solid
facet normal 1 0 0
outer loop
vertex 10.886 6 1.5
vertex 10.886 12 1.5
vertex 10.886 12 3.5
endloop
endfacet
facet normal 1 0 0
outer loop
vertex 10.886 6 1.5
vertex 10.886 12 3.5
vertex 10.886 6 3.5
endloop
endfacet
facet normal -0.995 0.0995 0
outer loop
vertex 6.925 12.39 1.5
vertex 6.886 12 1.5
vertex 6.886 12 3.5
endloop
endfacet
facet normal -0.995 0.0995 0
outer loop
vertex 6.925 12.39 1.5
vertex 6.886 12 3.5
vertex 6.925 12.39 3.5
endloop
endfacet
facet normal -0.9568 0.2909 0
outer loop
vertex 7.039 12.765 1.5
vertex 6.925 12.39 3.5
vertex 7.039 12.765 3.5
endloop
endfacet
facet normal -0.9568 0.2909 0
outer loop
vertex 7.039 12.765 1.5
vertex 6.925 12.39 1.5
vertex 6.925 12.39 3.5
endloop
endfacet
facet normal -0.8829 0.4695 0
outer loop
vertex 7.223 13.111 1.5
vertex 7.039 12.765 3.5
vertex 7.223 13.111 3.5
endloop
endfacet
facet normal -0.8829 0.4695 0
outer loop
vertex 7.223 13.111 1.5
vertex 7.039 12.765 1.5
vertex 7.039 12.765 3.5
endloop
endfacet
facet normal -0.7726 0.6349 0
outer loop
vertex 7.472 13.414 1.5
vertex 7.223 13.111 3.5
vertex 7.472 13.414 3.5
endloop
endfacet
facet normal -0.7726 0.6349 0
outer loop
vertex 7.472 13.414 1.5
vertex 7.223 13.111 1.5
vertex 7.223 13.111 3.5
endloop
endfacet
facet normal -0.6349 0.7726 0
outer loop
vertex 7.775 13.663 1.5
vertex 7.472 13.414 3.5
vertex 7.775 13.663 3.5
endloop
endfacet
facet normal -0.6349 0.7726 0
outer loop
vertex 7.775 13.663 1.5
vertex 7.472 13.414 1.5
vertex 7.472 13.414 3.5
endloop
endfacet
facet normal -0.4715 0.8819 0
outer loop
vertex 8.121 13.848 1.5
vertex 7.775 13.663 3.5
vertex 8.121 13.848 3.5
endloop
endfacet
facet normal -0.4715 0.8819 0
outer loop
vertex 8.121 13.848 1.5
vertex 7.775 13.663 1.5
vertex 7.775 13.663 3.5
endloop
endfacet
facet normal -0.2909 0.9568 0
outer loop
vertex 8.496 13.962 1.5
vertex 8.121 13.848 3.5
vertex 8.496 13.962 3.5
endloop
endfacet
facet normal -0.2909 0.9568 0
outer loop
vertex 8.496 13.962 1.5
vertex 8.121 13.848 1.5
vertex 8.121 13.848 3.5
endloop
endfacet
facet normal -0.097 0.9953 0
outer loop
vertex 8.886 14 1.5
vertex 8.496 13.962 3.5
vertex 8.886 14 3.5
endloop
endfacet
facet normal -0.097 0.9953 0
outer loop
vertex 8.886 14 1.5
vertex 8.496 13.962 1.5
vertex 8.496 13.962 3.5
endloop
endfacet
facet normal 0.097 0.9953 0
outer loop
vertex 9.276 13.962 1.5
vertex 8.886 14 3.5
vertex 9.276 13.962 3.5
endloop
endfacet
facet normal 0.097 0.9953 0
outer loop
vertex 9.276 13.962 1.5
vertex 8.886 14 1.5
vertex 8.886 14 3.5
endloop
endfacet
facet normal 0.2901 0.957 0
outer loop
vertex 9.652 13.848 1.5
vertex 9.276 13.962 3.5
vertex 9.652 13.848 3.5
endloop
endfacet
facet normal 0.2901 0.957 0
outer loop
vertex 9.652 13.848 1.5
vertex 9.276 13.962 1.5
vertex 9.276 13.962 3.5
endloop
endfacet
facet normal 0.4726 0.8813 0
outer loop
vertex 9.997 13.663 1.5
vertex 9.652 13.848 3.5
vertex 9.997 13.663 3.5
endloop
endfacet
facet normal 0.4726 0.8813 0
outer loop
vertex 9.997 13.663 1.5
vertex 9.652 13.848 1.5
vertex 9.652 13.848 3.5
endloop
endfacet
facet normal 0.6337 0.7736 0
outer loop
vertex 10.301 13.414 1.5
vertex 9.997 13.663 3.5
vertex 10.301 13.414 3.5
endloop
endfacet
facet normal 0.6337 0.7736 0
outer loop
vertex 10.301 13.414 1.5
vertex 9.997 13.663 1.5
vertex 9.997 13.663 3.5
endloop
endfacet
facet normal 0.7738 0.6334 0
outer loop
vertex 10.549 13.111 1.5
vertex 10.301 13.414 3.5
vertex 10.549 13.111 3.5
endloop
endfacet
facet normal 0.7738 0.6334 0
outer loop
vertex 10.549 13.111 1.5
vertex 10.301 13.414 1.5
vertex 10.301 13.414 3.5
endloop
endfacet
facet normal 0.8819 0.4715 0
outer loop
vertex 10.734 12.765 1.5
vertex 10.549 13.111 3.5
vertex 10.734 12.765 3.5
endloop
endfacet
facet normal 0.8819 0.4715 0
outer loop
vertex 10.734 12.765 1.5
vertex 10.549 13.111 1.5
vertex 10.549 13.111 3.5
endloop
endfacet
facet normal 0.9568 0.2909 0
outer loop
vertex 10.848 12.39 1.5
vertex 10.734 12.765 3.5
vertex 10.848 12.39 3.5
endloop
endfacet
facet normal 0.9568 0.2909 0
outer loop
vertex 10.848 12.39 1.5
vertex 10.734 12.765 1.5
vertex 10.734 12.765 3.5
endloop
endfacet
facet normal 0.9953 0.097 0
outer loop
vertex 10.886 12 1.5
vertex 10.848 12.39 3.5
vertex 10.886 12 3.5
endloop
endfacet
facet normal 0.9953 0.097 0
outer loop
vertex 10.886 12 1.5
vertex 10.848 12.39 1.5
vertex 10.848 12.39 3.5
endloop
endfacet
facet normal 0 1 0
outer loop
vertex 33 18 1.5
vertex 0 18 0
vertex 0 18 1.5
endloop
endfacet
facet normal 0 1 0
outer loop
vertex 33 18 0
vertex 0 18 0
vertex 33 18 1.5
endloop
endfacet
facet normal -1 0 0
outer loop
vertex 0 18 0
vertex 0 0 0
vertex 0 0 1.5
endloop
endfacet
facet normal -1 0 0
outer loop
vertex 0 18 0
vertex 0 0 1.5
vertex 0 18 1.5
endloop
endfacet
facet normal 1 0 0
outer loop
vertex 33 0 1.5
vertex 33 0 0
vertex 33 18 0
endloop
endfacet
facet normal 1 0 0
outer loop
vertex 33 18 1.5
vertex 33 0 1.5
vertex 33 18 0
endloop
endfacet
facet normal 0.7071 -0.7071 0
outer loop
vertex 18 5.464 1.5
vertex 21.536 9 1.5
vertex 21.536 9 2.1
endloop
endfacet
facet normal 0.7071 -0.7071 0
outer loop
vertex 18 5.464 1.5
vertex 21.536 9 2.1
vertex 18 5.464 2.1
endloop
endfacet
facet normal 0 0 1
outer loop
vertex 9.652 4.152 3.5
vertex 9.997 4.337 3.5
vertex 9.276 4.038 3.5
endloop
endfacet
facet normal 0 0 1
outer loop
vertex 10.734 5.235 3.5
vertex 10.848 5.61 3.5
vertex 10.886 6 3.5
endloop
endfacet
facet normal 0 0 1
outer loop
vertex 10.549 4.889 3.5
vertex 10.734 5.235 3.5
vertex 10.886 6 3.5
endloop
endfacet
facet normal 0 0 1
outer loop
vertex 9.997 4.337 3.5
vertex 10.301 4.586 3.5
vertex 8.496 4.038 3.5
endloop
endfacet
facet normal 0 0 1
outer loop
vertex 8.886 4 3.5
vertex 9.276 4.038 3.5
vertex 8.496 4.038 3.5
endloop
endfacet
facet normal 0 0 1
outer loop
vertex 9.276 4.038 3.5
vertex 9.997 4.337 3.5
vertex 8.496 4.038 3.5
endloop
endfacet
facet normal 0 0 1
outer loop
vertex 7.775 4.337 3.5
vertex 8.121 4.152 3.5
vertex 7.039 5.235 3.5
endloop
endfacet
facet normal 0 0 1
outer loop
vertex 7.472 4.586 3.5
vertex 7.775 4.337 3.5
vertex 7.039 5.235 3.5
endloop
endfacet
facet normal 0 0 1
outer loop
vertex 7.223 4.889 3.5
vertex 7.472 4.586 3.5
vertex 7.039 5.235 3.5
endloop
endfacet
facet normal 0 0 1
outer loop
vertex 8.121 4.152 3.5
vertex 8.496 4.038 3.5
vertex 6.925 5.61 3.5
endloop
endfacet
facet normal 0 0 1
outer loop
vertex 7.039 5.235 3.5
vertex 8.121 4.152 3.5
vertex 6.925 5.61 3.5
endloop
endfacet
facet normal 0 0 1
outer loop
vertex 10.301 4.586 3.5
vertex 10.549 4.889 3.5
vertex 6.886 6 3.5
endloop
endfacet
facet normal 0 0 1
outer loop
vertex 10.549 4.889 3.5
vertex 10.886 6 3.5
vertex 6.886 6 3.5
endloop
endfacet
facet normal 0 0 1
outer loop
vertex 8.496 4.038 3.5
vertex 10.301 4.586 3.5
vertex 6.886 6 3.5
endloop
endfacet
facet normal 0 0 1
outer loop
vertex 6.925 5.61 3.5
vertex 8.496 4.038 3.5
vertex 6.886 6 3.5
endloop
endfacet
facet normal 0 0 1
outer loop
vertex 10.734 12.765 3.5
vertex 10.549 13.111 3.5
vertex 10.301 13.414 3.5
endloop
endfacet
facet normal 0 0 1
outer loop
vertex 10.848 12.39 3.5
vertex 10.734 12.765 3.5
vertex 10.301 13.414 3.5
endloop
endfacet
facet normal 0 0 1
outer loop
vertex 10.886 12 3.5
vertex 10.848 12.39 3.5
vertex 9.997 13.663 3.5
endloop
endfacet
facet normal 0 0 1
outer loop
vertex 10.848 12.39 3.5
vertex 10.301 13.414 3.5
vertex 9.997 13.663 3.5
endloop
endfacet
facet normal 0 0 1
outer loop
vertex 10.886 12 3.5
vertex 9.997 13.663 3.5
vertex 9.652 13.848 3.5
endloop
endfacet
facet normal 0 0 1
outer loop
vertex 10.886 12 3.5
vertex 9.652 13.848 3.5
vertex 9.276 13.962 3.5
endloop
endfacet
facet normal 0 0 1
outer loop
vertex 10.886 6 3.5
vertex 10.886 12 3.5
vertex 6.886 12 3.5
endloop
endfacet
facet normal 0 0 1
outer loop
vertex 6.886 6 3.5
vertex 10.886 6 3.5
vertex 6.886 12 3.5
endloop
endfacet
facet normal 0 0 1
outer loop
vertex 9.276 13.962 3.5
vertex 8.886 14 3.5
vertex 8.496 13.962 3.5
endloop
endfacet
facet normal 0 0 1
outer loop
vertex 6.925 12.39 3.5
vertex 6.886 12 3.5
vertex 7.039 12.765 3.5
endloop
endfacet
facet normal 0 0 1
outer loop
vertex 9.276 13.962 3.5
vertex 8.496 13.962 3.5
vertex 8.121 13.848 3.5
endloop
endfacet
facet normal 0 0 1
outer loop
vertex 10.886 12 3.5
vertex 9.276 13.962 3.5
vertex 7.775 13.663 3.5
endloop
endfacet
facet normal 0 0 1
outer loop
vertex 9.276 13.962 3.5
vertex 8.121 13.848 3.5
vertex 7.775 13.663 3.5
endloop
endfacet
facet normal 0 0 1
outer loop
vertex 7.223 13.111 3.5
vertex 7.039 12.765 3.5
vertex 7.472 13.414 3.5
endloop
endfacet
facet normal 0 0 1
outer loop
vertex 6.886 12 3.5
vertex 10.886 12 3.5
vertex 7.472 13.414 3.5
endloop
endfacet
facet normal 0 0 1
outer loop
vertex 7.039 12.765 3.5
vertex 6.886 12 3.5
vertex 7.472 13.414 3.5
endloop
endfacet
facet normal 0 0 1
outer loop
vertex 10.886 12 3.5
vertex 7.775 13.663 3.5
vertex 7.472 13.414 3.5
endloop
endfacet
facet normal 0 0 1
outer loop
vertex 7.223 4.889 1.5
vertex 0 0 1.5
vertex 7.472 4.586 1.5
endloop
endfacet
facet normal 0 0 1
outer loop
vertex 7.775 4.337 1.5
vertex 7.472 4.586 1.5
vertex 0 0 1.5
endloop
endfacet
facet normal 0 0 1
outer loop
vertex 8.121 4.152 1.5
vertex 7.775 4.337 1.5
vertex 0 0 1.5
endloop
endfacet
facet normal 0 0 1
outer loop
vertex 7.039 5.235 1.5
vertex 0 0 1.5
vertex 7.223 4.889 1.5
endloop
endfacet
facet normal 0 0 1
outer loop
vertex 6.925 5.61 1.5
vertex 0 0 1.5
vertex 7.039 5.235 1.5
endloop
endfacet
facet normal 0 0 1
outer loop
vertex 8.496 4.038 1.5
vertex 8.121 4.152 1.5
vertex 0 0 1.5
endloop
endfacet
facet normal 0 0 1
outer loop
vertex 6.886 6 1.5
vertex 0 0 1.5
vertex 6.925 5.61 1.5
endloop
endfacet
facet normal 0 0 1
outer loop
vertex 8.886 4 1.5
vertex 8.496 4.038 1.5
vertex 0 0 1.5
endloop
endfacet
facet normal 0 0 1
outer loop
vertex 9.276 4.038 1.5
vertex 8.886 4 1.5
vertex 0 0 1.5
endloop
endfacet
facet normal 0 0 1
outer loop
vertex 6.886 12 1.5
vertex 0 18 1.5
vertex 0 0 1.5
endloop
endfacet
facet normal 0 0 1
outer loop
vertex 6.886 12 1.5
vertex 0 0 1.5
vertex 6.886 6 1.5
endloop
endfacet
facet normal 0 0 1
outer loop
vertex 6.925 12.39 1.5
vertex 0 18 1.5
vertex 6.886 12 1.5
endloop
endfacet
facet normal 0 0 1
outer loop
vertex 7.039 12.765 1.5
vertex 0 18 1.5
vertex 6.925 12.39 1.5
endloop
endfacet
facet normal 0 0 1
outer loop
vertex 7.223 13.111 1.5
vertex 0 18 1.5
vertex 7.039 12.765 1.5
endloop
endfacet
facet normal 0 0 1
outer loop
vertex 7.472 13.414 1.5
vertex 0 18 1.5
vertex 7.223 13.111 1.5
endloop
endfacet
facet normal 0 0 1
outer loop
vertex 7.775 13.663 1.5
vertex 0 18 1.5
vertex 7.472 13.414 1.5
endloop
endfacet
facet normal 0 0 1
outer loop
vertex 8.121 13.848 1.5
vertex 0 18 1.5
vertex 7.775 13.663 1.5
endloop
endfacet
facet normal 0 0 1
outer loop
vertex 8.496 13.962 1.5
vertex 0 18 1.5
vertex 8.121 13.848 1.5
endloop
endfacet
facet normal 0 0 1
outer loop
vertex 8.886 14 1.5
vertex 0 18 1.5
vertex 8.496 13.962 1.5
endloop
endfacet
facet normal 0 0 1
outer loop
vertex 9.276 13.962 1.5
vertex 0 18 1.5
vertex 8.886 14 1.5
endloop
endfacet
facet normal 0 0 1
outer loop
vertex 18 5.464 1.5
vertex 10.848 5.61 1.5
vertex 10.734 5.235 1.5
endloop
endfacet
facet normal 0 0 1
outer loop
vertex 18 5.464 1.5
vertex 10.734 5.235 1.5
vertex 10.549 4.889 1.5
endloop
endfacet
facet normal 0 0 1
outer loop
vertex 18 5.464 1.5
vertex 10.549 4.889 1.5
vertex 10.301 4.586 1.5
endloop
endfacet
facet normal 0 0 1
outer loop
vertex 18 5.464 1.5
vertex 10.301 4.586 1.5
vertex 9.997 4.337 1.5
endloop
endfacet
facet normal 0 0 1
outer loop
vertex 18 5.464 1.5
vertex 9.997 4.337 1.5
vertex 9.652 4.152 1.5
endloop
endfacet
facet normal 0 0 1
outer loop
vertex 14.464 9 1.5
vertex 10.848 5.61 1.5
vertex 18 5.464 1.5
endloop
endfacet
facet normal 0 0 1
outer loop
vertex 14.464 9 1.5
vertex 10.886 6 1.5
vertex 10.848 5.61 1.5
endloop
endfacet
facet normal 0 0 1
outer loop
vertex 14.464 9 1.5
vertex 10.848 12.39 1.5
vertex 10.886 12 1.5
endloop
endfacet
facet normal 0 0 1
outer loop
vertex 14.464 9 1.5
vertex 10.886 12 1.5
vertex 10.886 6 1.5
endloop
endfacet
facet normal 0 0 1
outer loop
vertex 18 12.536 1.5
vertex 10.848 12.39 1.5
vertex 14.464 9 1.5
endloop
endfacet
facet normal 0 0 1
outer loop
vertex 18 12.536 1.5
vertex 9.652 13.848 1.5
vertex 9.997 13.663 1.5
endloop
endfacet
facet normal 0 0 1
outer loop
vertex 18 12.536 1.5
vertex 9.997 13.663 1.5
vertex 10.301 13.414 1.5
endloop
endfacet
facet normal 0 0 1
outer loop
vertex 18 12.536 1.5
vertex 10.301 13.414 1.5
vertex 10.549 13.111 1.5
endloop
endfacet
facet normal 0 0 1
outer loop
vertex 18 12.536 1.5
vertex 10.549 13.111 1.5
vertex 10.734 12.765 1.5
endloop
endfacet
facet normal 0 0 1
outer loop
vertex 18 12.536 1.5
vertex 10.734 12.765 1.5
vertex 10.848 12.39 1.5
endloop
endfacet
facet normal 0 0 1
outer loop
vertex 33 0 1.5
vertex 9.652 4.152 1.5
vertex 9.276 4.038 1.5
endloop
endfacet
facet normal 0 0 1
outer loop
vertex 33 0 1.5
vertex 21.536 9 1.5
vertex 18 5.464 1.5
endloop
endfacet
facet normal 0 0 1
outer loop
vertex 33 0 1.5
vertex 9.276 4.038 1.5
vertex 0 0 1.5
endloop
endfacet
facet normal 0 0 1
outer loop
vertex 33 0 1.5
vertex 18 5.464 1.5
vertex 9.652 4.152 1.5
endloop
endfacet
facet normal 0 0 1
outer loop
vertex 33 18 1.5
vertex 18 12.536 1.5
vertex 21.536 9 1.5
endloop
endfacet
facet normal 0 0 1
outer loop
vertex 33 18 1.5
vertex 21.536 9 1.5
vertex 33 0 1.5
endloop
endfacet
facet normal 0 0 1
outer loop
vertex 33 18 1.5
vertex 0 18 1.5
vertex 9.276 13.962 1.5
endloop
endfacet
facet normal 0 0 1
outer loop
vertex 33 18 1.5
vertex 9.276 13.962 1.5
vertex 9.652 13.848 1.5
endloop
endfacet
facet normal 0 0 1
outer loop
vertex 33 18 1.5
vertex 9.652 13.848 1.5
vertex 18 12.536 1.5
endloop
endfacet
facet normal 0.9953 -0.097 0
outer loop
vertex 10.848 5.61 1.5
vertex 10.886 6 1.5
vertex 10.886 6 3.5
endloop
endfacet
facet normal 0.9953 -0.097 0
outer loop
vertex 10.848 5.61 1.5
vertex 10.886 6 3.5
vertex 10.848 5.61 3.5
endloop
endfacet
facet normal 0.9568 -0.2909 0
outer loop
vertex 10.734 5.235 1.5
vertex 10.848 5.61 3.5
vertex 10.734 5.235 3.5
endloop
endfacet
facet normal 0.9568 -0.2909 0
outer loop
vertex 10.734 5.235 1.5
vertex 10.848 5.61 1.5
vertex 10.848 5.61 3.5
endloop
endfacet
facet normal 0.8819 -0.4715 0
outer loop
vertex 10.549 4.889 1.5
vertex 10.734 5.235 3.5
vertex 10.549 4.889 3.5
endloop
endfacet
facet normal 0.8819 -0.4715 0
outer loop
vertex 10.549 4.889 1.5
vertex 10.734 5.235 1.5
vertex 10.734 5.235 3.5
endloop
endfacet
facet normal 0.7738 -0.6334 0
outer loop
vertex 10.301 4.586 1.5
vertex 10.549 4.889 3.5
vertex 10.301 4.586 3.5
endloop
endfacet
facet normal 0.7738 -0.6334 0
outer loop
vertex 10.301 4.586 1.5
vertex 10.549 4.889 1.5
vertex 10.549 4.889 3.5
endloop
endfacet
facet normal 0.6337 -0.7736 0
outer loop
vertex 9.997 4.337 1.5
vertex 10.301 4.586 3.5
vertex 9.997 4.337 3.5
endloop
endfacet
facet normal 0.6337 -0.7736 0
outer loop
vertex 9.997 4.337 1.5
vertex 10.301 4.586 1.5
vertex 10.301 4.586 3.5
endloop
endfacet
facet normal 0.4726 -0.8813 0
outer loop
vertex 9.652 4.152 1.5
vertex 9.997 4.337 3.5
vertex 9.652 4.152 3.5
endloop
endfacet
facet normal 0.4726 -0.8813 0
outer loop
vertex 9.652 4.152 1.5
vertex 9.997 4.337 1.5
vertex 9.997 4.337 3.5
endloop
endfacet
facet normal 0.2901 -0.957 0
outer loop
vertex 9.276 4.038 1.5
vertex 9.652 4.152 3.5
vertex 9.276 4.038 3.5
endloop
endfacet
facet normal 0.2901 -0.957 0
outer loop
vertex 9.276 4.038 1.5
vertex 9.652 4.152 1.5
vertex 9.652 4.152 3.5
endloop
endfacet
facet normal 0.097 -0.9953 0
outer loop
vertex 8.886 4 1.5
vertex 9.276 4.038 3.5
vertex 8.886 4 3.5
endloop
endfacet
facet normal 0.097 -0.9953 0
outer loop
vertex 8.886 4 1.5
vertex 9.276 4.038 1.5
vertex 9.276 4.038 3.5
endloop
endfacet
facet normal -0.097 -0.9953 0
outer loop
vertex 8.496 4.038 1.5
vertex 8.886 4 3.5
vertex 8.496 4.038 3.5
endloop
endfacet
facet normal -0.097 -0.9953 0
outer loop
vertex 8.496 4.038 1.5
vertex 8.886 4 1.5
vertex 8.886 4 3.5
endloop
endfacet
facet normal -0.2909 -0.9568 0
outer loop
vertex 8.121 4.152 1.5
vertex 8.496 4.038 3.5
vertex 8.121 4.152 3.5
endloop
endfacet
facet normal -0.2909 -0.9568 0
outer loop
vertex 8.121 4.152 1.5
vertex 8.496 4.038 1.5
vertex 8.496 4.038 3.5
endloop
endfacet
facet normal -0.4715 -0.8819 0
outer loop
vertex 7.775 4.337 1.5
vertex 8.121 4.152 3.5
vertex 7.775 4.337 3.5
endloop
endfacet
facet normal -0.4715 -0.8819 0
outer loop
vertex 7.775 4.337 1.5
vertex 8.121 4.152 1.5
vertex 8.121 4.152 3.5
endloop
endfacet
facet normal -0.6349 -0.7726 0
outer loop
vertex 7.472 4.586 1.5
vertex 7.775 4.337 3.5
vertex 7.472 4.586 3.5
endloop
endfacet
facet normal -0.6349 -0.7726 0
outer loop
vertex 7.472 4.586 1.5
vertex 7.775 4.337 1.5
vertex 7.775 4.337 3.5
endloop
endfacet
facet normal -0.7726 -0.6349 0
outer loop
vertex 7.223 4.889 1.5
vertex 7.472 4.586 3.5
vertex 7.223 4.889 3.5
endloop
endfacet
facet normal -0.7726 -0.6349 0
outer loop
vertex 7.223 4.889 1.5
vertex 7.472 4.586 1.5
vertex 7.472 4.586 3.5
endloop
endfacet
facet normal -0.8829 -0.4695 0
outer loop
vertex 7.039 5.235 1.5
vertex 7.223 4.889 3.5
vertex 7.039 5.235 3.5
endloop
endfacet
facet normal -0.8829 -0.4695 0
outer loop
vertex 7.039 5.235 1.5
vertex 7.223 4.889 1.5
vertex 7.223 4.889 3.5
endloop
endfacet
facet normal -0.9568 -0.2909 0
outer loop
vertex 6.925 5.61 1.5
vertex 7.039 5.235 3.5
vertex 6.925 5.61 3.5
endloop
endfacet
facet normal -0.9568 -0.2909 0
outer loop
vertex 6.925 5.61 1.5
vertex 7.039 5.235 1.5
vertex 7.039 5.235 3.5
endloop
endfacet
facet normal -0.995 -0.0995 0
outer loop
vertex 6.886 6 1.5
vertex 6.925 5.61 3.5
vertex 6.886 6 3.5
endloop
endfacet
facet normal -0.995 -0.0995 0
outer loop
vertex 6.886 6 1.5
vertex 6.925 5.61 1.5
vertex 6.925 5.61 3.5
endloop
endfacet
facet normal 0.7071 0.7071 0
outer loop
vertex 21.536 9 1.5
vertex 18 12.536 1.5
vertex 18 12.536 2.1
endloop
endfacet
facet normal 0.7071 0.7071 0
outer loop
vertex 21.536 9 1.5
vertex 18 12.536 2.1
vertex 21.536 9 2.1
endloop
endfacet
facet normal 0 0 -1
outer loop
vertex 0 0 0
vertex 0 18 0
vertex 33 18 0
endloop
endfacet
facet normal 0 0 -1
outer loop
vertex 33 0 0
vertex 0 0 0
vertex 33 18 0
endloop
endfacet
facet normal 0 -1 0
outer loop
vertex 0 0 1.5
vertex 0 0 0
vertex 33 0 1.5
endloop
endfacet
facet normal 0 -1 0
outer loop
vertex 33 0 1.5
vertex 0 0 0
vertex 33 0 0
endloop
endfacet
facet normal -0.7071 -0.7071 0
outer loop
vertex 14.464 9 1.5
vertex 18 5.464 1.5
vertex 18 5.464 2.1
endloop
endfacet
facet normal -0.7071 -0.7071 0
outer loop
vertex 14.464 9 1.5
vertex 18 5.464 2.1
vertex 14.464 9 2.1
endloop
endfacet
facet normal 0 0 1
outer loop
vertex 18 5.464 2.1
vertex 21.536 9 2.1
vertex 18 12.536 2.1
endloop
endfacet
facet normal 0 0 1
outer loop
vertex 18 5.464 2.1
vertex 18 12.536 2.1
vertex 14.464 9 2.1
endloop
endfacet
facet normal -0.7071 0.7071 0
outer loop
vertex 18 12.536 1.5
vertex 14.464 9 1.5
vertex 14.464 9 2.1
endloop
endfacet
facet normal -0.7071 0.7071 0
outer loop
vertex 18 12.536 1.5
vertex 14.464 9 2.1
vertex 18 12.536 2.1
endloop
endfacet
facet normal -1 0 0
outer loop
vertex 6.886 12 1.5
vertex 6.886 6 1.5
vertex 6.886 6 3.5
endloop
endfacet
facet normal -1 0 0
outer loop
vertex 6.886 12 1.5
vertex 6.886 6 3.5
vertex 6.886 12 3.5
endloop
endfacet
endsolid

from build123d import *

# Parameters (mm, degrees)
SKETCH_1_W      = 33
SKETCH_1_H      = 18
EXTRUDE_1_DEPTH = 1.5
EXTRUDE_2_DEPTH = 0.6
EXTRUDE_3_DEPTH = 2


with BuildPart() as part:
    # Эскиз1 → Бобышка-Вытянуть1 (new body)
    with BuildSketch(Plane.XY):
        with Locations((16.5, 9)):
            Rectangle(SKETCH_1_W, SKETCH_1_H)
    extrude(amount=EXTRUDE_1_DEPTH)

    # Эскиз2 → Бобышка-Вытянуть2 (add)
    with BuildSketch(Plane.XY.offset(1.5)):
        Polygon((18, 12.535533906), (21.535533906, 9), (18, 5.464466094), (14.464466094, 9), align=None)
    extrude(amount=EXTRUDE_2_DEPTH)

    # Эскиз3 → Бобышка-Вытянуть3 (add)
    with BuildSketch(Plane.XY.offset(1.5)):
        with BuildLine():
            Line((6.886292912, 6), (6.886292912, 12))
            ThreePointArc((6.886292912, 12), (8.886292912, 14), (10.886292912, 12))
            Line((10.886292912, 12), (10.886292912, 6))
            ThreePointArc((10.886292912, 6), (8.886292912, 4), (6.886292912, 6))
        make_face()
    extrude(amount=EXTRUDE_3_DEPTH)


solid = part.part
